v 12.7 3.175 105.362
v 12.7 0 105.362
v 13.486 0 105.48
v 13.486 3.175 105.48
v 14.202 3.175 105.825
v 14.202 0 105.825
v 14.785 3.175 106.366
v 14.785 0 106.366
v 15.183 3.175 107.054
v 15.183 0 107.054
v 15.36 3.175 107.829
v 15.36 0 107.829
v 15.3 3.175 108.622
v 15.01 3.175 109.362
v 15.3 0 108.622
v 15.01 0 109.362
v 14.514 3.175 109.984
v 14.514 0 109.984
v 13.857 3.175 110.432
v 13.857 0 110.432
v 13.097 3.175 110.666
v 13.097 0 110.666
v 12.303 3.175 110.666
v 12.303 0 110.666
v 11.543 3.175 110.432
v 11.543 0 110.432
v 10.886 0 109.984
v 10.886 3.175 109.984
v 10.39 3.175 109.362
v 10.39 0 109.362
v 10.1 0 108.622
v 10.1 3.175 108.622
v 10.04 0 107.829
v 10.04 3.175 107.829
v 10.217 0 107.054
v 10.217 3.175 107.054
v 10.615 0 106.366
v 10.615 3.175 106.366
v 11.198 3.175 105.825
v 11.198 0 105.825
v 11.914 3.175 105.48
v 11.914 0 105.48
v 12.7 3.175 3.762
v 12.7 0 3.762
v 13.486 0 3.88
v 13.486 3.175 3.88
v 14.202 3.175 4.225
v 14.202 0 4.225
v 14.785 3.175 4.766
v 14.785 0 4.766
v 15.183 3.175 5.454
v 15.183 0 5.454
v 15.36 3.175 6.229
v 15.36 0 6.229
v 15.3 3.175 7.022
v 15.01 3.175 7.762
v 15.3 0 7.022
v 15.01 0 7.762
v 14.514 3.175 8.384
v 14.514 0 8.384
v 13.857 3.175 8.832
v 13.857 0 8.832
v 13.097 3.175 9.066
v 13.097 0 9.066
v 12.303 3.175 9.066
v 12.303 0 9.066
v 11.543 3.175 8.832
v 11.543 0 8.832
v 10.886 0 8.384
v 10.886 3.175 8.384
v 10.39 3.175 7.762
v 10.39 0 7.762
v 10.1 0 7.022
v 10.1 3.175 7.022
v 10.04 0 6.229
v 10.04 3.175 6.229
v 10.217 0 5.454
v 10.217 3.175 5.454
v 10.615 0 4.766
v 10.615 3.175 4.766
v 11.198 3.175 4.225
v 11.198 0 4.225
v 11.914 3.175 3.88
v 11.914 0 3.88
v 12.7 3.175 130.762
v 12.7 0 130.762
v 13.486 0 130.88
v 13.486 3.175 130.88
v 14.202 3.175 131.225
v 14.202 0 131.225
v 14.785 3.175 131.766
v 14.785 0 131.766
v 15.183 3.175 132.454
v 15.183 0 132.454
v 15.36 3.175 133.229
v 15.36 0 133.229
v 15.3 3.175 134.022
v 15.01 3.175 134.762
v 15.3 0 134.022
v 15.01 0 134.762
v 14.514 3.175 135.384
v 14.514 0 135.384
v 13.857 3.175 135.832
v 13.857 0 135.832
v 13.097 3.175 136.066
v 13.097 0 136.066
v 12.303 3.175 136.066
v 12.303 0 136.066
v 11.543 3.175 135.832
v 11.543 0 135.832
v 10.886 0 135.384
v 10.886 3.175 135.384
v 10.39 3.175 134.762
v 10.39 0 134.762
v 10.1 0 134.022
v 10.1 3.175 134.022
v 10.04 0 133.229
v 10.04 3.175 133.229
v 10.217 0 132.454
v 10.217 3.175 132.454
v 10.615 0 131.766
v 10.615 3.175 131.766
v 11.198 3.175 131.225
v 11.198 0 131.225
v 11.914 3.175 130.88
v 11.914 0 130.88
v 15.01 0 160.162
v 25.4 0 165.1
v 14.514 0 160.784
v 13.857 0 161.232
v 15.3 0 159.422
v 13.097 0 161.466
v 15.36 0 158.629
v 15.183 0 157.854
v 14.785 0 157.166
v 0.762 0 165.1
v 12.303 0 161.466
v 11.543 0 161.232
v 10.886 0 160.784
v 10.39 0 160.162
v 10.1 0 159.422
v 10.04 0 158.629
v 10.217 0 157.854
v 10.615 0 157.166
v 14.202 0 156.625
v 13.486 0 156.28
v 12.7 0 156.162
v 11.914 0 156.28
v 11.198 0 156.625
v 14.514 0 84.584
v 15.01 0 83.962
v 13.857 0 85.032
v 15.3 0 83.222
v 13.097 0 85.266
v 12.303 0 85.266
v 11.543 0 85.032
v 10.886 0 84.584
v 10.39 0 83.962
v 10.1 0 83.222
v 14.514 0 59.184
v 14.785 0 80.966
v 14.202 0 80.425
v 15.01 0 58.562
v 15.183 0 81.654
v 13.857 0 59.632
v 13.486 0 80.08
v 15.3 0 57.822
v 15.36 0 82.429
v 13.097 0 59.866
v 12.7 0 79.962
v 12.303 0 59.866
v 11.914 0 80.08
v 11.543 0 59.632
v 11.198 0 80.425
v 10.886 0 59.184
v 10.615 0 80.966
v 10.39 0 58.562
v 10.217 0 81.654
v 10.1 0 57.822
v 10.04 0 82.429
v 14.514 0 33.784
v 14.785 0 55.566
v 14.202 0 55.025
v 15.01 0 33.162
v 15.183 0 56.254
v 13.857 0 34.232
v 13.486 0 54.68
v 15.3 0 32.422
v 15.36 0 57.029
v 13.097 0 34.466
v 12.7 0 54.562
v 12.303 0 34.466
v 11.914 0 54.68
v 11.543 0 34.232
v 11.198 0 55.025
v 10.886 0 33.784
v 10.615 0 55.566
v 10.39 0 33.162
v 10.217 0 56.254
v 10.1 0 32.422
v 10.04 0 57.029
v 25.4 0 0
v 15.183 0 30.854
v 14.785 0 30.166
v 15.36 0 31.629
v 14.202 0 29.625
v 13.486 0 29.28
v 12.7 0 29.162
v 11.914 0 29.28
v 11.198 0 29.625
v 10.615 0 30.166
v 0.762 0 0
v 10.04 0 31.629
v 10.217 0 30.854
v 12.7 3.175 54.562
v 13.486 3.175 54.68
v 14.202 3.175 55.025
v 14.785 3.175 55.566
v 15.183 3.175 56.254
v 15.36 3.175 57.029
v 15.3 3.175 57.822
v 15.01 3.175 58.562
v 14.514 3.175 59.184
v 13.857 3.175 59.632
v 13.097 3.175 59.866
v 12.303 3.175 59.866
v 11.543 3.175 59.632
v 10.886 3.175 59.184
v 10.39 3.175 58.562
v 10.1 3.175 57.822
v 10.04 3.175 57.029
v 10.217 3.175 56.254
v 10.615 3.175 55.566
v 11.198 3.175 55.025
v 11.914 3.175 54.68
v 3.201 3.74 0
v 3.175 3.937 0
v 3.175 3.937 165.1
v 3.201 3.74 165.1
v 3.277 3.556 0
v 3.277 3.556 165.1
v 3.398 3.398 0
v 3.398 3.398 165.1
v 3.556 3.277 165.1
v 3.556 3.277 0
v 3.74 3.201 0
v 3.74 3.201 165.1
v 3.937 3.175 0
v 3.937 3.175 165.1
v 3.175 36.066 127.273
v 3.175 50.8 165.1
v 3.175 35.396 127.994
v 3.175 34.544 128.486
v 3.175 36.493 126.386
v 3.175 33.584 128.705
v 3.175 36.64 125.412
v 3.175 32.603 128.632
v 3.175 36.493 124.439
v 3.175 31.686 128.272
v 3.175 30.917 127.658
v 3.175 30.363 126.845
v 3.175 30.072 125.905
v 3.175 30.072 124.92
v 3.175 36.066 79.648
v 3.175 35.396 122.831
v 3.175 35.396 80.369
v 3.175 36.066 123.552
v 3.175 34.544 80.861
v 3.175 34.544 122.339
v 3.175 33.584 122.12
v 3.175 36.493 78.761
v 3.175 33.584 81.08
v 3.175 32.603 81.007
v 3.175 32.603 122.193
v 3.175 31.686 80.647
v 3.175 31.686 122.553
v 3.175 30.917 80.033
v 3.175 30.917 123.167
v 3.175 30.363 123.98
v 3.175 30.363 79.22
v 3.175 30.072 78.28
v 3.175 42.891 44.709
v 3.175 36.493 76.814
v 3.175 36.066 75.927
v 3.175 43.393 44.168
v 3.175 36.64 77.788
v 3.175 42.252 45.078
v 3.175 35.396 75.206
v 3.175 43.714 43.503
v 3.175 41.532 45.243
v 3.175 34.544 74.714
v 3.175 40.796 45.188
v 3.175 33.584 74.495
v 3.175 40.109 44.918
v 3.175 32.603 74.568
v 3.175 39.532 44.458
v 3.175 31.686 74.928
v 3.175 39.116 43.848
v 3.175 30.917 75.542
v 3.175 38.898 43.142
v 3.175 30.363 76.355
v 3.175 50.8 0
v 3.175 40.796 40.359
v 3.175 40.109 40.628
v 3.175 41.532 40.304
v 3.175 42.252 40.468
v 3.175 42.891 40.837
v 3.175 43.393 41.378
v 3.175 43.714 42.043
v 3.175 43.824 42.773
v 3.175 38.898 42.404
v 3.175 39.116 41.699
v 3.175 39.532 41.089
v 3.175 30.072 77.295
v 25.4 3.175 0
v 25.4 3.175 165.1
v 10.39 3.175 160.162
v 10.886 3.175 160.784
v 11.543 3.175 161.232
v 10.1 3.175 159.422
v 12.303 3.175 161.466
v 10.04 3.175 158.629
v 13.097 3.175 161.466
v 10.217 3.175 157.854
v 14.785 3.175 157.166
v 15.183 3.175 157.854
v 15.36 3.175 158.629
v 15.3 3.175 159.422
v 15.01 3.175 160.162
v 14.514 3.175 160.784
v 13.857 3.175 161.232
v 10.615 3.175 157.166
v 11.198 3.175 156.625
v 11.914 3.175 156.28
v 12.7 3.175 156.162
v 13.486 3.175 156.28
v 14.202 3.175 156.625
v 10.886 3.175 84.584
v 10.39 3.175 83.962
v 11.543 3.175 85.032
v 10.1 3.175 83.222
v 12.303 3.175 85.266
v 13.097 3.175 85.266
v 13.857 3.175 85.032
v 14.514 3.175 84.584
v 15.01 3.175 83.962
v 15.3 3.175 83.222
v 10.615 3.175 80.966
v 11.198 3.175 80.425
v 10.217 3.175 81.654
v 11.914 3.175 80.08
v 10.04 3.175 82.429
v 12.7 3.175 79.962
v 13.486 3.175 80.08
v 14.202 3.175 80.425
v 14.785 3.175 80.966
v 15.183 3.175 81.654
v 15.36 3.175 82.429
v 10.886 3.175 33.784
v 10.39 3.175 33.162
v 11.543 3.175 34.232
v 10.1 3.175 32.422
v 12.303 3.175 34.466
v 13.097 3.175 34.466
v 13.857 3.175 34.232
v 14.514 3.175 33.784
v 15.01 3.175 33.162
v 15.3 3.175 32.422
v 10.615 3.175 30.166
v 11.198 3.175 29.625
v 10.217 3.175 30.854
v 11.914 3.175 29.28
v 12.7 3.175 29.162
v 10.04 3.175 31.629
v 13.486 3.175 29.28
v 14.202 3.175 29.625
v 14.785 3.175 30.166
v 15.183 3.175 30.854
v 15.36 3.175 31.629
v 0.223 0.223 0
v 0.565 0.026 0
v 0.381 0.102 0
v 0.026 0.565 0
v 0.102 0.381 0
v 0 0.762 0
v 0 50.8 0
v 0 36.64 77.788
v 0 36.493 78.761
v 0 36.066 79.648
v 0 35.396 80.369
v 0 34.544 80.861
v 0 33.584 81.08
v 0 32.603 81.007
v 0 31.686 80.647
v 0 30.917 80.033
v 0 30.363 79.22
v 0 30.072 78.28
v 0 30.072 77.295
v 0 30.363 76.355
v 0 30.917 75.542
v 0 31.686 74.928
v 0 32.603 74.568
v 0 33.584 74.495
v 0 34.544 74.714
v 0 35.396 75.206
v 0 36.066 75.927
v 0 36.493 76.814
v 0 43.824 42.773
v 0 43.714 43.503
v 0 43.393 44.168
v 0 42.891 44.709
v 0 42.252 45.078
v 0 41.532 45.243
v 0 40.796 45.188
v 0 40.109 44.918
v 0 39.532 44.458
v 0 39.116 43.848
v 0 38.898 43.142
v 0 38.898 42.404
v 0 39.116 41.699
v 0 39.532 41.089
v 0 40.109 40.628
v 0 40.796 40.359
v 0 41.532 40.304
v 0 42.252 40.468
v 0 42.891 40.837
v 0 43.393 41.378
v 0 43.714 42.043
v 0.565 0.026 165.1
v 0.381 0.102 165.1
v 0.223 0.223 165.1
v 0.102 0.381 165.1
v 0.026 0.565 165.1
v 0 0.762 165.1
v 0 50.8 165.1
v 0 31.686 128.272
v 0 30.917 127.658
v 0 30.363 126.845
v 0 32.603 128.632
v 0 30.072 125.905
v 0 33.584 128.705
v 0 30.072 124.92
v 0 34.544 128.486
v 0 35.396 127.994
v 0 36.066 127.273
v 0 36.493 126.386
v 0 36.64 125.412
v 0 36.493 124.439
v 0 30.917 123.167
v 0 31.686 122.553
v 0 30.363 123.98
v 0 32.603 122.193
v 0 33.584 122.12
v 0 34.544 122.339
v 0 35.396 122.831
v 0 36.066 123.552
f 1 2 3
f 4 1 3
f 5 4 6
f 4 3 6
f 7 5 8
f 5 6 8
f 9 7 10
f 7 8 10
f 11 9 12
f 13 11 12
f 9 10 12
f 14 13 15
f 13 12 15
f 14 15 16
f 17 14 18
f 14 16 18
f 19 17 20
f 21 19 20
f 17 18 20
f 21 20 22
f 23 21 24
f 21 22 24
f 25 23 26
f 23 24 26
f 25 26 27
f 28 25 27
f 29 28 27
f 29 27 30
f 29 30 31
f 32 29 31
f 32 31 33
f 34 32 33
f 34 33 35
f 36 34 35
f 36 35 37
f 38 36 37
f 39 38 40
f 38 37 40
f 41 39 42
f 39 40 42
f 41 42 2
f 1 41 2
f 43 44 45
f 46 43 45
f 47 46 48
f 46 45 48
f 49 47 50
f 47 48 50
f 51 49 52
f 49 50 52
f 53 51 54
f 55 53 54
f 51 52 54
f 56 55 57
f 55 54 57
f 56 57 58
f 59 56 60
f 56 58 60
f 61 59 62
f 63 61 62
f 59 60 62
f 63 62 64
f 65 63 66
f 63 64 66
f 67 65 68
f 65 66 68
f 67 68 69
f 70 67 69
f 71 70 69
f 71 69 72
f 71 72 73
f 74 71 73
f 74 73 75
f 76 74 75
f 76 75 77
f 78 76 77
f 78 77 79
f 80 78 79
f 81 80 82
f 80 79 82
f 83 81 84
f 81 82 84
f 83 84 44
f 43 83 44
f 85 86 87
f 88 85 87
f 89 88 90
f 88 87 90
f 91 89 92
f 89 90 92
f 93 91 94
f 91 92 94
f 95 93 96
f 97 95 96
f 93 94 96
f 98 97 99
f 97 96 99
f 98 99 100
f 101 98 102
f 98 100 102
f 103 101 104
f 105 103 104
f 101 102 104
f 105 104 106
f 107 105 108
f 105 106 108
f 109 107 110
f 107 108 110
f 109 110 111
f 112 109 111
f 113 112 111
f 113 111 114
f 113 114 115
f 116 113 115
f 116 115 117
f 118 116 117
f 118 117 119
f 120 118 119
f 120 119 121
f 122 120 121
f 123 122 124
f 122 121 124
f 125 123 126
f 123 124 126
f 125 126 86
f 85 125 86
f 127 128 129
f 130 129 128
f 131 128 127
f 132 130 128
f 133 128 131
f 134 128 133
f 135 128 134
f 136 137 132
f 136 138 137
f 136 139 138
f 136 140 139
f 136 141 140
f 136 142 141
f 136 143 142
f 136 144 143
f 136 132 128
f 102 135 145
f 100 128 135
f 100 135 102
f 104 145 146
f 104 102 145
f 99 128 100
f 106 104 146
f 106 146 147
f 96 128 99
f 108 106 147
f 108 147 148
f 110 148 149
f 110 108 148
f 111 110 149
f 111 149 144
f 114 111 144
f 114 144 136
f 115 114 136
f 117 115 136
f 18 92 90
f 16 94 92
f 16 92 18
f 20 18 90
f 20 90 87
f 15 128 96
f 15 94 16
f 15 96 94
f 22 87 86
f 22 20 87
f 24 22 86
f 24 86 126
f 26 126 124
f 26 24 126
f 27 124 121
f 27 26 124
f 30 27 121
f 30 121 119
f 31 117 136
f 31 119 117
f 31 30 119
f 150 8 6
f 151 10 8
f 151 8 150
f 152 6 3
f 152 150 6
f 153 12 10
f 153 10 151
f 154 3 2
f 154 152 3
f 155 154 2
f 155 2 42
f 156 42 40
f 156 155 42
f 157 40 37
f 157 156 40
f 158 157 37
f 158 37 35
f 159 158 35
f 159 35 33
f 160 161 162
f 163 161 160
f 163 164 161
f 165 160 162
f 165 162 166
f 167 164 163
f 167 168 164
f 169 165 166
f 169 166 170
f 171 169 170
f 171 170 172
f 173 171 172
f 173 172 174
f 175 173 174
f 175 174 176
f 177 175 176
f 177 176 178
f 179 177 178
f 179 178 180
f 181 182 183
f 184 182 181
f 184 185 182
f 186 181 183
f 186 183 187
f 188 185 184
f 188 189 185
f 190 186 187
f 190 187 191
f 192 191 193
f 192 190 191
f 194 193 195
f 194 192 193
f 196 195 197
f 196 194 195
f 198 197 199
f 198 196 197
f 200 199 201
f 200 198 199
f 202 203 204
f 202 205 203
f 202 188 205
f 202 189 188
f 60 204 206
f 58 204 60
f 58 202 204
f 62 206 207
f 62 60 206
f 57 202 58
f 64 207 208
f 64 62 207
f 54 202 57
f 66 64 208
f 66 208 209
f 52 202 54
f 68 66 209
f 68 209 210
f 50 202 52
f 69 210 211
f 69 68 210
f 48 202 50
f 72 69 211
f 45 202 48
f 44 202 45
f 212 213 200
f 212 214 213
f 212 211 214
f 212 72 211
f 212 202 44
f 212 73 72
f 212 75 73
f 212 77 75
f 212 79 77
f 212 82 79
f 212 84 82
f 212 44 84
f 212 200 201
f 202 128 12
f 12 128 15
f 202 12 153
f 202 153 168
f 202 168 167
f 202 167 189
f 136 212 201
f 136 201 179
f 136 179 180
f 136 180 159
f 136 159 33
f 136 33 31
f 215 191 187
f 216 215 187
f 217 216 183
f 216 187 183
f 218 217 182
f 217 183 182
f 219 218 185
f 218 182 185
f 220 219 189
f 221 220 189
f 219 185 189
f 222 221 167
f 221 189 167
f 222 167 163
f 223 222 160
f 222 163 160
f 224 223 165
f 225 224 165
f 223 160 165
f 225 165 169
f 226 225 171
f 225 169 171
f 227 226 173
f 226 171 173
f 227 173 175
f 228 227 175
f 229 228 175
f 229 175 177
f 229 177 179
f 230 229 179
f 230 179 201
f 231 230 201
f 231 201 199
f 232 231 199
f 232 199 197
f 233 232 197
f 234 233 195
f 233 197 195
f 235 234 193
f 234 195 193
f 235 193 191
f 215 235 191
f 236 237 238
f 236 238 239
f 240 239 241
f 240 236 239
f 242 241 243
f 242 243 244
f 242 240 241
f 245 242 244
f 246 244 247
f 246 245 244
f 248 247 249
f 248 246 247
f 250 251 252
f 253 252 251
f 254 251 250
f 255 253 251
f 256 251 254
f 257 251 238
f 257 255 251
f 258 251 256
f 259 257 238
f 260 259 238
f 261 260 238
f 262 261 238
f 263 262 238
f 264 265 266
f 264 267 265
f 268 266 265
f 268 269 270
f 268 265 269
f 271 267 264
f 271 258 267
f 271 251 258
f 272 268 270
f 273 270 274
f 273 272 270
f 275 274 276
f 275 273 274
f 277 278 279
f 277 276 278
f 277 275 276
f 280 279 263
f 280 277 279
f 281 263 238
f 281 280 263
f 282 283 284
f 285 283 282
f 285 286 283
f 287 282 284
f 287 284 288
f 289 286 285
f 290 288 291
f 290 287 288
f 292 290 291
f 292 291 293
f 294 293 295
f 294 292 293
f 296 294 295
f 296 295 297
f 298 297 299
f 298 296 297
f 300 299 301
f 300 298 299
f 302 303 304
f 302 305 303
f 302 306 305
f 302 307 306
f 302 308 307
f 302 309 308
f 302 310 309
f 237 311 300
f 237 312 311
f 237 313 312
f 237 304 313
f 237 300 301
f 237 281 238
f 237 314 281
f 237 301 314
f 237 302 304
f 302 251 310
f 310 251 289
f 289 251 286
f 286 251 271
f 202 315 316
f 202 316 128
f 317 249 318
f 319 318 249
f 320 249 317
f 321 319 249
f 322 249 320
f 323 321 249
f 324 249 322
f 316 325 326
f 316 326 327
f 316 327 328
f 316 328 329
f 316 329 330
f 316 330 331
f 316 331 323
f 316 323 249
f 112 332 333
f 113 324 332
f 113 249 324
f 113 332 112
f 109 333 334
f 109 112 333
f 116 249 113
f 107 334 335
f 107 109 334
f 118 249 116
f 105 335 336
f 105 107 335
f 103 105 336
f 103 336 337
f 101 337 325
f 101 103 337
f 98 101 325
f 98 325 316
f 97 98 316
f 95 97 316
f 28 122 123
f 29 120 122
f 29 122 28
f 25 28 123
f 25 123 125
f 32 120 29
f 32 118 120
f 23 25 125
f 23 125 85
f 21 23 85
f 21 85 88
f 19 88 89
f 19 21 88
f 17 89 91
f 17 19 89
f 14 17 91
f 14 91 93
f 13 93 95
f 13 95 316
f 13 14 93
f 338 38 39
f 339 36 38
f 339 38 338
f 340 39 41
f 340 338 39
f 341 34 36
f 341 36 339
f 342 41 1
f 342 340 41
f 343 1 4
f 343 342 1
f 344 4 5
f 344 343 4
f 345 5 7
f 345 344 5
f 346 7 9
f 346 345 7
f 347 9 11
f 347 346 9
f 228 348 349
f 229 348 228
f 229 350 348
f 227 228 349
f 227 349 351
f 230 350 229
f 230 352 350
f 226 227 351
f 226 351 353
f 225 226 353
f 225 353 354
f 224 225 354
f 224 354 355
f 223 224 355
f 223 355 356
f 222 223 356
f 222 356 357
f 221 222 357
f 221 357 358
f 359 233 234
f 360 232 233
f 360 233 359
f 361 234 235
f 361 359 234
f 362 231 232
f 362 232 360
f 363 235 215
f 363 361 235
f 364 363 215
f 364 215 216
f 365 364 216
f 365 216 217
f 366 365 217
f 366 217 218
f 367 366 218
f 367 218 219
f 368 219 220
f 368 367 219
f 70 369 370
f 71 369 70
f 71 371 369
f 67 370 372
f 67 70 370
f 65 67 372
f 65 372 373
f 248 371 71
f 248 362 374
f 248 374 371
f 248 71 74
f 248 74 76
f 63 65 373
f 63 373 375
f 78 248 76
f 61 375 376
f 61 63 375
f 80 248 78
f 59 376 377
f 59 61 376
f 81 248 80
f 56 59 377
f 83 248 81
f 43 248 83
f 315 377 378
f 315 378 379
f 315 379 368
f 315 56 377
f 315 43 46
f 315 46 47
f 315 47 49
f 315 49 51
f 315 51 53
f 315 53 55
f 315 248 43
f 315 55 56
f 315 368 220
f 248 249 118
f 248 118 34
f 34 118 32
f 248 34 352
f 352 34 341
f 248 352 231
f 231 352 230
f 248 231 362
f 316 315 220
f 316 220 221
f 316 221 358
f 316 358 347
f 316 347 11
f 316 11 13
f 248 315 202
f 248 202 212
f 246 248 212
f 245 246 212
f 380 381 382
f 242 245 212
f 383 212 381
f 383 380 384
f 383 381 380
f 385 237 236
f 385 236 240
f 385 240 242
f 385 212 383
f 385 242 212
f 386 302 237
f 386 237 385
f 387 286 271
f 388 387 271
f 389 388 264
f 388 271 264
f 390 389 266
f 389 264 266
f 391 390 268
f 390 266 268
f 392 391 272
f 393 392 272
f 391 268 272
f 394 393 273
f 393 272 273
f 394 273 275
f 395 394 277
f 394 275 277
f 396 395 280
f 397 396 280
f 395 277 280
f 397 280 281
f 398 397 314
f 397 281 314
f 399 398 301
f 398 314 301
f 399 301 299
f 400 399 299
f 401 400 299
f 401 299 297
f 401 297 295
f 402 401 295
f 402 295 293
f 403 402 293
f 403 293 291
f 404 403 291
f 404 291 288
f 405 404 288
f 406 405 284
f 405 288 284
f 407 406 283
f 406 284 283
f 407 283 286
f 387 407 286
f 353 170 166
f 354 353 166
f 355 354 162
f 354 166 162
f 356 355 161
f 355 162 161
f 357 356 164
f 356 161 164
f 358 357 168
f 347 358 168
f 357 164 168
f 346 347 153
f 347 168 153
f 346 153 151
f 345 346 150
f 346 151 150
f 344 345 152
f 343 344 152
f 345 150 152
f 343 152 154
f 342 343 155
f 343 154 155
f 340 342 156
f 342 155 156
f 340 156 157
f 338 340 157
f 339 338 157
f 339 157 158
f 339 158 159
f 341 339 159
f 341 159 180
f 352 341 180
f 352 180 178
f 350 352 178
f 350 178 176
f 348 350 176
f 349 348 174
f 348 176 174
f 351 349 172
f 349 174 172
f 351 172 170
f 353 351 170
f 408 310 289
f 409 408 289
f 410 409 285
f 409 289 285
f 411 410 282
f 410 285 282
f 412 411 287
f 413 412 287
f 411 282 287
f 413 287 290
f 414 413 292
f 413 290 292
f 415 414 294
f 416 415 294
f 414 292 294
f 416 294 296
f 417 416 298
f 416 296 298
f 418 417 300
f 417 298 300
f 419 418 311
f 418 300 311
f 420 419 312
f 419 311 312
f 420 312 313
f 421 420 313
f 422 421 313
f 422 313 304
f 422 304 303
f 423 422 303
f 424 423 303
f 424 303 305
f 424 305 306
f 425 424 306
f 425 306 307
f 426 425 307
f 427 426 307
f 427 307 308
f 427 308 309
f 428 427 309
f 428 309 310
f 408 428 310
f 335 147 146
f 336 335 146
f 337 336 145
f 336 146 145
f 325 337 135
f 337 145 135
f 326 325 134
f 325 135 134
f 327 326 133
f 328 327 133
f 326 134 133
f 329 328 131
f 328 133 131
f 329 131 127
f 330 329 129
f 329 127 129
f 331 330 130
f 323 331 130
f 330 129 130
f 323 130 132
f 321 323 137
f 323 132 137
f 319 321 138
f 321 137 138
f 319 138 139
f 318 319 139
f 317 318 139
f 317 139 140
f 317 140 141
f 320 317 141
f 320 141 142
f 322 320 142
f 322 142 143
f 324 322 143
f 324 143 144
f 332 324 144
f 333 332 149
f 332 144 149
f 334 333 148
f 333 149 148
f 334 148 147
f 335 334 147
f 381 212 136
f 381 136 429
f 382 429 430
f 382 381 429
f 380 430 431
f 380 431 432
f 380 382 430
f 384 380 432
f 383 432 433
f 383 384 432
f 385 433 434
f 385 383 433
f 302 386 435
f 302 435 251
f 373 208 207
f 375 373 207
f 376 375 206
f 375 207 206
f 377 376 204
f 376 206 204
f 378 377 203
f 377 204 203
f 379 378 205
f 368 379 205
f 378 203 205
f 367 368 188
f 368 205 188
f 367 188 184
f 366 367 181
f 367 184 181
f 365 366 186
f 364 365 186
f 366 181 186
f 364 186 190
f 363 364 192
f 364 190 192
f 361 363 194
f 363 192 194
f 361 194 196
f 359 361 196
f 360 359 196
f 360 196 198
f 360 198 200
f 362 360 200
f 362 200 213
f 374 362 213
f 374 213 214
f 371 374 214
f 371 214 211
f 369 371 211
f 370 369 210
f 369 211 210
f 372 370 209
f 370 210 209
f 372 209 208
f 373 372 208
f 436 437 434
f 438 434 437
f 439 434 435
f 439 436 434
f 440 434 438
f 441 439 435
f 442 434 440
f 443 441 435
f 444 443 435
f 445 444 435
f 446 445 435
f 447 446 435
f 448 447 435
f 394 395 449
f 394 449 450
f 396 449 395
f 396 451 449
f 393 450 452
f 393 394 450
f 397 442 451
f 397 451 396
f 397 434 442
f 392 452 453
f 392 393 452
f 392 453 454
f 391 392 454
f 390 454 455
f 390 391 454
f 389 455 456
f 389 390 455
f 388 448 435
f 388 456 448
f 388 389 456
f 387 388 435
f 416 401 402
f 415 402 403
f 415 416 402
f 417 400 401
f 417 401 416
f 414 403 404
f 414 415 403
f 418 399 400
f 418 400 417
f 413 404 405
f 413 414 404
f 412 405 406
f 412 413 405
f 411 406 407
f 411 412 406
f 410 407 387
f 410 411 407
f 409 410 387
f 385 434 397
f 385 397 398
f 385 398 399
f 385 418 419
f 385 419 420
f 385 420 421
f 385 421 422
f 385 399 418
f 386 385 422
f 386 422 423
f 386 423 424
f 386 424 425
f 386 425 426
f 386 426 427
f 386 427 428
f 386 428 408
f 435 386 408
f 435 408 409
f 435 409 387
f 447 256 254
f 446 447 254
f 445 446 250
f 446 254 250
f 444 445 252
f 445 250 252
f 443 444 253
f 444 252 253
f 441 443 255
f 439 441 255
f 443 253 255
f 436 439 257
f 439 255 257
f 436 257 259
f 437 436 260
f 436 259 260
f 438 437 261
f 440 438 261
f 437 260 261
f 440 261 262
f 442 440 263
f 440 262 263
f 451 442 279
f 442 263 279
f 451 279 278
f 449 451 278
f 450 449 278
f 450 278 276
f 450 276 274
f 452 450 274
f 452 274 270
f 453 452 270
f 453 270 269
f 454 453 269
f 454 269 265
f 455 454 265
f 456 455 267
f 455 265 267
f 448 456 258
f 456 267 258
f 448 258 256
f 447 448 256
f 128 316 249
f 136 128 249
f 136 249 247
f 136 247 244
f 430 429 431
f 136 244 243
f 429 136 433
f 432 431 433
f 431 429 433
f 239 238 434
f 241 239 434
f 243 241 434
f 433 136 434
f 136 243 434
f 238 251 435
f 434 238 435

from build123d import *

# Parameters (mm, degrees)
BOSS_EXTRUDE1_DEPTH = 165.1
SKETCH3_R           = 2.667
CUT_EXTRUDE2_DEPTH  = 3.175
SKETCH4_R           = 3.302
CUT_EXTRUDE3_DEPTH  = 3.175
SKETCH5_R           = 2.4765
CUT_EXTRUDE4_DEPTH  = 6.35


with BuildPart() as part:
    # Sketch1 → Boss-Extrude1 (new body)
    with BuildSketch(Plane.XY):
        with BuildLine():
            Line((3.175, 50.8), (3.175, 3.937))
            ThreePointArc((3.175, 3.937), (3.398184633, 3.398184633), (3.937, 3.175))
            Line((3.937, 3.175), (25.4, 3.175))
            Line((25.4, 3.175), (25.4, 0))
            Line((25.4, 0), (0.762, 0))
            ThreePointArc((0.762, 0), (0.223184633, 0.223184633), (0, 0.762))
            Line((0, 0.762), (0, 50.8))
            Line((0, 50.8), (3.175, 50.8))
        make_face()
    extrude(amount=BOSS_EXTRUDE1_DEPTH)

    # Sketch3 → Cut-Extrude2 (cut)
    with BuildSketch(Plane.XZ):
        with Locations(Location((12.7, 6.42874, 0), (0, 0, 270))):
            Circle(SKETCH3_R)
        with Locations(Location((12.7, 31.82874, 0), (0, 0, 270))):
            Circle(SKETCH3_R)
        with Locations(Location((12.7, 57.22874, 0), (0, 0, 270))):
            Circle(SKETCH3_R)
        with Locations(Location((12.7, 82.62874, 0), (0, 0, 270))):
            Circle(SKETCH3_R)
        with Locations(Location((12.7, 108.02874, 0), (0, 0, 270))):
            Circle(SKETCH3_R)
        with Locations(Location((12.7, 133.42874, 0), (0, 0, 270))):
            Circle(SKETCH3_R)
        with Locations(Location((12.7, 158.82874, 0), (0, 0, 270))):
            Circle(SKETCH3_R)
    extrude(amount=-CUT_EXTRUDE2_DEPTH, mode=Mode.SUBTRACT)

    # Sketch4 → Cut-Extrude3 (cut)
    with BuildSketch(Plane(origin=(3.175, 0, 0), x_dir=(0, 0, -1), z_dir=(1, 0, 0))):
        with Locations(Location((-77.7875, 33.3375, 0), (0, 0, 90))):
            Circle(SKETCH4_R)
        with Locations(Location((-125.4125, 33.3375, 0), (0, 0, 90))):
            Circle(SKETCH4_R)
    extrude(amount=-CUT_EXTRUDE3_DEPTH, mode=Mode.SUBTRACT)

    # Sketch5 → Cut-Extrude4 (cut)
    with BuildSketch(Plane(origin=(6.35, 0, 0), x_dir=(0, 0, -1), z_dir=(1, 0, 0))):
        with Locations(Location((-42.773092, 41.347136, 0), (0, 0, 90))):
            Circle(SKETCH5_R)
    extrude(amount=-CUT_EXTRUDE4_DEPTH, mode=Mode.SUBTRACT)


solid = part.part
